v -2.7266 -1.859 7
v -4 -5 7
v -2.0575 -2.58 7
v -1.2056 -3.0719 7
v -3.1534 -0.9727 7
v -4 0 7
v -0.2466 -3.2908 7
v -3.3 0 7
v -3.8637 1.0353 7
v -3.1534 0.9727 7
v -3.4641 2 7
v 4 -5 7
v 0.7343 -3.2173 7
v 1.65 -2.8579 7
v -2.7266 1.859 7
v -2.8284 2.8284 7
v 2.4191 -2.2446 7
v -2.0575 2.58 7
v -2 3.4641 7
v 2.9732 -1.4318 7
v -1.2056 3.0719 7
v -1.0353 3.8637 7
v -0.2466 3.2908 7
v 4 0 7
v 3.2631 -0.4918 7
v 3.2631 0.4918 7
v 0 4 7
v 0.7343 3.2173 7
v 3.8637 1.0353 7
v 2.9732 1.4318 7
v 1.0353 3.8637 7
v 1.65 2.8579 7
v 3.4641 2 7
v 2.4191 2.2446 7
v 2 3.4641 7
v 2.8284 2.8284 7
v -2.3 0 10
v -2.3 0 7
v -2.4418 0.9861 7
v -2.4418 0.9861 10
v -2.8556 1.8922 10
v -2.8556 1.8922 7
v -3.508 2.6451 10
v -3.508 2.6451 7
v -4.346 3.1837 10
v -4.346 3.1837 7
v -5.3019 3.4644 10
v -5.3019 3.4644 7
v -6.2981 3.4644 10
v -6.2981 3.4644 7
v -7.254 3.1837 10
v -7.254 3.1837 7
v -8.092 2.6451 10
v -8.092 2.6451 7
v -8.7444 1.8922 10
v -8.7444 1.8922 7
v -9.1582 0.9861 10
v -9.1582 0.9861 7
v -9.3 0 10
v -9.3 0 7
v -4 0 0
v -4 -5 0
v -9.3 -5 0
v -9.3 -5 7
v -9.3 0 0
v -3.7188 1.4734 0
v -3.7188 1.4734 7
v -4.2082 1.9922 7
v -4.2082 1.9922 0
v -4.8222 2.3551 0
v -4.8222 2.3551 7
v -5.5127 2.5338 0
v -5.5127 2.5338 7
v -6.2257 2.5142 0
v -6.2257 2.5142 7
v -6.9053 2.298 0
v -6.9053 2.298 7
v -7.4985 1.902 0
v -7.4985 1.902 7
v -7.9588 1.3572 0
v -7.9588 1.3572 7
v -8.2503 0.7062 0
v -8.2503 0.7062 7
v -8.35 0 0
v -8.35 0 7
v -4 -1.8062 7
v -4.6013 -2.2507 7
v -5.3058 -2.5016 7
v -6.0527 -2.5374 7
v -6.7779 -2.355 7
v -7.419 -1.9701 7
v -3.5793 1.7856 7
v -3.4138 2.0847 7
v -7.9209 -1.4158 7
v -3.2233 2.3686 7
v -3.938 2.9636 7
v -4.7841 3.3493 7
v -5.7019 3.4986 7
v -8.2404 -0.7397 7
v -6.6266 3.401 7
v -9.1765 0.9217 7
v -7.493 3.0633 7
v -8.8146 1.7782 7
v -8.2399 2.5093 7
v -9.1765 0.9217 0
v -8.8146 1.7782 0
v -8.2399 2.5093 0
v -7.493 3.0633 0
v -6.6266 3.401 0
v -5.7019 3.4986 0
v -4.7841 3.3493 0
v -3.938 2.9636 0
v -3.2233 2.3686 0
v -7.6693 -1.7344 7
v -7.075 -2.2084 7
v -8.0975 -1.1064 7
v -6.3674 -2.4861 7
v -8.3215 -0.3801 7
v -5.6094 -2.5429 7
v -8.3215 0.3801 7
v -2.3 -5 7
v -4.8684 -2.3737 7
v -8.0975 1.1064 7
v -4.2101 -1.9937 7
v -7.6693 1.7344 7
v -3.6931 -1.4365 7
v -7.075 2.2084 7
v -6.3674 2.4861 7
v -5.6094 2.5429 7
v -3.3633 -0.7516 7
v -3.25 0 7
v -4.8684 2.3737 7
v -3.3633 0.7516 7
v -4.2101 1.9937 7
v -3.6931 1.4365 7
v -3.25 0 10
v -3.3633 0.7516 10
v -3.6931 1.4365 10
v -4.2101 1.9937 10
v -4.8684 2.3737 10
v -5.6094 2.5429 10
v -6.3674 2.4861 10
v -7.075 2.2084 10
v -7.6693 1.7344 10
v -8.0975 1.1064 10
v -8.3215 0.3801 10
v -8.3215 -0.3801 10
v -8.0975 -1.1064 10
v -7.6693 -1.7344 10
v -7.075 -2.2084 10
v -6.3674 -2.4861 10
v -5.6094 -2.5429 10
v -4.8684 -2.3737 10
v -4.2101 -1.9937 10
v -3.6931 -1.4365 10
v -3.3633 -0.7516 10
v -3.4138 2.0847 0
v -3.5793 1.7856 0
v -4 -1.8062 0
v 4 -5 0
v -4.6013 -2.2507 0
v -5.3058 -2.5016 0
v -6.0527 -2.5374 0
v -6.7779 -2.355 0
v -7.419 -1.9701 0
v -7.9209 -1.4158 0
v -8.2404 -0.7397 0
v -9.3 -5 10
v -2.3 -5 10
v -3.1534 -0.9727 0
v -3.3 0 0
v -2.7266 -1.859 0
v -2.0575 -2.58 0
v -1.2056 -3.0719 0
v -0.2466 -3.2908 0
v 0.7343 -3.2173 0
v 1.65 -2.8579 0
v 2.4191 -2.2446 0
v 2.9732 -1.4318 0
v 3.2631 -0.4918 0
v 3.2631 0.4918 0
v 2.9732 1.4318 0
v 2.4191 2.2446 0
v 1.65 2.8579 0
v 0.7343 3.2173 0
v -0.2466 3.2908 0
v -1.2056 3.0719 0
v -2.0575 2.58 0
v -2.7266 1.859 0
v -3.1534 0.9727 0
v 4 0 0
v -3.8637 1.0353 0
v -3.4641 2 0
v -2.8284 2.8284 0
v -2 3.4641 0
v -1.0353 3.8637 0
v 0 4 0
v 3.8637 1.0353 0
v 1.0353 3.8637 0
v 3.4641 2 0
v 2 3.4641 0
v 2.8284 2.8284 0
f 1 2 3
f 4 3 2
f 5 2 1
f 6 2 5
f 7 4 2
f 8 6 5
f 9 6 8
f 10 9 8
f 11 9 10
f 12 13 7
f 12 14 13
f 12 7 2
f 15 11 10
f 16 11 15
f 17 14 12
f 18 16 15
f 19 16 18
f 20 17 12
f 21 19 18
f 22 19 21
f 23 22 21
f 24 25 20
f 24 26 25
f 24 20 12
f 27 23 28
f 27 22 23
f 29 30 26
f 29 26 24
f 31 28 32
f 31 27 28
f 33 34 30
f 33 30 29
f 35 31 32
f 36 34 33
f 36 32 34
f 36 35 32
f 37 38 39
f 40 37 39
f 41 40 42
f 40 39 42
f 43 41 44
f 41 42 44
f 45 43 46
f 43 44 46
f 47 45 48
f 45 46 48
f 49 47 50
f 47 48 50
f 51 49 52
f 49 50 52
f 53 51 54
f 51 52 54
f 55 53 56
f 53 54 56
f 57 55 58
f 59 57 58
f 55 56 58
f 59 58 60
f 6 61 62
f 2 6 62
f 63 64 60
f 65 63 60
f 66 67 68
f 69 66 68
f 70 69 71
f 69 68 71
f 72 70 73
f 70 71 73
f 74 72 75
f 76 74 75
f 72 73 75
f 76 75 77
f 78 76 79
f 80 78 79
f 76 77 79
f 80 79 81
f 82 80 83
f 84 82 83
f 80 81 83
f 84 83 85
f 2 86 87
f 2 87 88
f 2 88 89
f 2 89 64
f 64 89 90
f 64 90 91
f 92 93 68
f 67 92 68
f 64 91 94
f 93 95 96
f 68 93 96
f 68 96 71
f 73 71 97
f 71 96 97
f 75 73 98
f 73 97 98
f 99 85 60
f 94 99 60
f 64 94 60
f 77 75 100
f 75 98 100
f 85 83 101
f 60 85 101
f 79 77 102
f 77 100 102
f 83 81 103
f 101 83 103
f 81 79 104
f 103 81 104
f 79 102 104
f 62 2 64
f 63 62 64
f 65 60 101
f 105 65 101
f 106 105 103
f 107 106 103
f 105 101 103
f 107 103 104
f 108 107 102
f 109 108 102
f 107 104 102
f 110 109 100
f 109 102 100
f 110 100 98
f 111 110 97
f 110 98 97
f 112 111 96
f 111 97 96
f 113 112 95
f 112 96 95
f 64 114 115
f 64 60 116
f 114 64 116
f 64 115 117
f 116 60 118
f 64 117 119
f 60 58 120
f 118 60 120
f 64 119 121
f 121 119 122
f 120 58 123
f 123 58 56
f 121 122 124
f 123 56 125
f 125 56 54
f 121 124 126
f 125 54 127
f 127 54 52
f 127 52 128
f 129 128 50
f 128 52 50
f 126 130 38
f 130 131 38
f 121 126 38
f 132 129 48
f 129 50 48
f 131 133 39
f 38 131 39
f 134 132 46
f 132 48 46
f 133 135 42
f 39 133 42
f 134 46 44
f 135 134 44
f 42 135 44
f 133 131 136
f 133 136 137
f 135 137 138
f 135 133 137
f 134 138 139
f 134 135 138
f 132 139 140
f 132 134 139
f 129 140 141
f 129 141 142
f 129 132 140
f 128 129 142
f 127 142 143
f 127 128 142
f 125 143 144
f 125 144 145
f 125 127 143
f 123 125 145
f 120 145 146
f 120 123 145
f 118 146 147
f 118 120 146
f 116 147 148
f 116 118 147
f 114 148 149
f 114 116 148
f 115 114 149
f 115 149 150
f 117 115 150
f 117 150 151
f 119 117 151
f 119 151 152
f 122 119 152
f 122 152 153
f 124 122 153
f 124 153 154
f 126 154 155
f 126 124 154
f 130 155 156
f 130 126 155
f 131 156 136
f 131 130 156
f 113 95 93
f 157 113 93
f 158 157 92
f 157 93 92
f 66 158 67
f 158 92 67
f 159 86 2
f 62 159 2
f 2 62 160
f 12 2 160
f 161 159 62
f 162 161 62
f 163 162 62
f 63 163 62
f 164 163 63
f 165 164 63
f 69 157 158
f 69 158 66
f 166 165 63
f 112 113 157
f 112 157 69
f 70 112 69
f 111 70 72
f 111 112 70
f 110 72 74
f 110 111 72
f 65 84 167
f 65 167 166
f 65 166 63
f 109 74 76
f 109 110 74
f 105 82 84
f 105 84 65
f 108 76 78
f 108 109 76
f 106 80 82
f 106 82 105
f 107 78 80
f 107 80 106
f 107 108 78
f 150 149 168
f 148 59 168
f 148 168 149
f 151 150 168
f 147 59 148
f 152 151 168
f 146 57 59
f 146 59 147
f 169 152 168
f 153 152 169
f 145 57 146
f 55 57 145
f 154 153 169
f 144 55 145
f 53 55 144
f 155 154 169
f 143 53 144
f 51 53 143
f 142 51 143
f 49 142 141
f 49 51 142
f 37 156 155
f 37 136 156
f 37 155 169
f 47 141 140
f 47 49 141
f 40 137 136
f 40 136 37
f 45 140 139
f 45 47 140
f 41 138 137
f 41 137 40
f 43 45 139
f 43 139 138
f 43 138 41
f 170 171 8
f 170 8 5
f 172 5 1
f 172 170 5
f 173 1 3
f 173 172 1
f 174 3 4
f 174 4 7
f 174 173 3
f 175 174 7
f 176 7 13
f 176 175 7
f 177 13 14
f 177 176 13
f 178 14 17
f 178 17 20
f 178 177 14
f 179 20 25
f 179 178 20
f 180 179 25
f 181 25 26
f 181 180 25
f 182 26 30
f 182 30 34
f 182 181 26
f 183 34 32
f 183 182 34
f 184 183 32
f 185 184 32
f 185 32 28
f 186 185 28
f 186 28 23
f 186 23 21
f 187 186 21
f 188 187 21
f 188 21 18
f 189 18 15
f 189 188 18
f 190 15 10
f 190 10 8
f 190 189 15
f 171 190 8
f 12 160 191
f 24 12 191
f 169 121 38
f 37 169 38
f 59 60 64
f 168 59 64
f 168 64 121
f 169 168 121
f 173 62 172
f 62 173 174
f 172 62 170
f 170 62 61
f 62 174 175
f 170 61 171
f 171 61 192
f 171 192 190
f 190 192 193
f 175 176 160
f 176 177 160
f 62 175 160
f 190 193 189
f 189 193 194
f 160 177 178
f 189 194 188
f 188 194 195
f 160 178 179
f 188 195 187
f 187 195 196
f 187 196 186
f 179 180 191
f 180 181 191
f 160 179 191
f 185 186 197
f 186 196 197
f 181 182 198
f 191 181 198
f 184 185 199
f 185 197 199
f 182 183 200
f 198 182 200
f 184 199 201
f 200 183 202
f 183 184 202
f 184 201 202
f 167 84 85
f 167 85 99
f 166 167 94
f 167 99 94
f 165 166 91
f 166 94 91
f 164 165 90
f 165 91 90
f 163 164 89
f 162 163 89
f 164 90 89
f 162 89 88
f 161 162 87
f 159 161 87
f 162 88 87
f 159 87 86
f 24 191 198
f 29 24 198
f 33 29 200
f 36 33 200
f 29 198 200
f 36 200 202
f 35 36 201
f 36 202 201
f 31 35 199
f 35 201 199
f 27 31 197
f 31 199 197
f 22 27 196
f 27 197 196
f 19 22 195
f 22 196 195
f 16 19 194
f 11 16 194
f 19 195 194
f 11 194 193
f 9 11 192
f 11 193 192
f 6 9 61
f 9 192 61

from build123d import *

# Parameters (mm, degrees)
SKETCH1_R            = 3.3
BOSS_EXTRUDE1_DEPTH  = 7
SKETCH2_R            = 2.55
BOSS_EXTRUDE4_DEPTH  = 3
BOSS_EXTRUDE10_DEPTH = 7


with BuildPart() as part:
    # Sketch1 → Boss-Extrude1 (new body)
    with BuildSketch(Plane.XY):
        with BuildLine():
            Line((-4, 0), (-4, -5))
            Line((-4, -5), (4, -5))
            Line((4, -5), (4, 0))
            ThreePointArc((4, 0), (0, 4), (-4, 0))
        make_face()
        with Locations(Location((0, 0, 0), (0, 0, 180))):
            Circle(SKETCH1_R, mode=Mode.SUBTRACT)
    extrude(amount=BOSS_EXTRUDE1_DEPTH)


with BuildPart() as body_2:
    # Sketch2 → Boss-Extrude4 (new body)
    with BuildSketch(Plane.XY.offset(7)):
        with BuildLine():
            Line((-9.3, 0), (-9.3, -5))
            Line((-9.3, -5), (-4, -5))
            Line((-4, -5), (-2.3, -5))
            Line((-2.3, -5), (-2.3, 0))
            ThreePointArc((-2.3, 0), (-5.8, 3.5), (-9.3, 0))
        make_face()
        with Locations((-5.8, 0)):
            Circle(SKETCH2_R, mode=Mode.SUBTRACT)
    extrude(amount=BOSS_EXTRUDE4_DEPTH)


with BuildPart() as body_3:
    # Sketch6 → Boss-Extrude10 (new body)
    with BuildSketch(Plane(origin=(0, 0, 7), x_dir=(-1, 0, 0), z_dir=(0, 0, -1))):
        with BuildLine():
            ThreePointArc((8.35, 0), (6.777880361, -2.35504777), (4, -1.806239187))
            Line((4, -1.806239187), (4, -5))
            Line((4, -5), (9.3, -5))
            Line((9.3, -5), (9.3, 0))
            ThreePointArc((9.3, 0), (7.07111477, 3.261022423), (3.223275862, 2.368647867))
            ThreePointArc((3.223275862, 2.368647867), (3.49975704, 1.936930732), (3.71875, 1.473396904))
            ThreePointArc((3.71875, 1.473396904), (6.573082305, 2.429988426), (8.35, 0))
        make_face()
    extrude(amount=BOSS_EXTRUDE10_DEPTH)


solid = Compound([part.part, body_2.part, body_3.part])
